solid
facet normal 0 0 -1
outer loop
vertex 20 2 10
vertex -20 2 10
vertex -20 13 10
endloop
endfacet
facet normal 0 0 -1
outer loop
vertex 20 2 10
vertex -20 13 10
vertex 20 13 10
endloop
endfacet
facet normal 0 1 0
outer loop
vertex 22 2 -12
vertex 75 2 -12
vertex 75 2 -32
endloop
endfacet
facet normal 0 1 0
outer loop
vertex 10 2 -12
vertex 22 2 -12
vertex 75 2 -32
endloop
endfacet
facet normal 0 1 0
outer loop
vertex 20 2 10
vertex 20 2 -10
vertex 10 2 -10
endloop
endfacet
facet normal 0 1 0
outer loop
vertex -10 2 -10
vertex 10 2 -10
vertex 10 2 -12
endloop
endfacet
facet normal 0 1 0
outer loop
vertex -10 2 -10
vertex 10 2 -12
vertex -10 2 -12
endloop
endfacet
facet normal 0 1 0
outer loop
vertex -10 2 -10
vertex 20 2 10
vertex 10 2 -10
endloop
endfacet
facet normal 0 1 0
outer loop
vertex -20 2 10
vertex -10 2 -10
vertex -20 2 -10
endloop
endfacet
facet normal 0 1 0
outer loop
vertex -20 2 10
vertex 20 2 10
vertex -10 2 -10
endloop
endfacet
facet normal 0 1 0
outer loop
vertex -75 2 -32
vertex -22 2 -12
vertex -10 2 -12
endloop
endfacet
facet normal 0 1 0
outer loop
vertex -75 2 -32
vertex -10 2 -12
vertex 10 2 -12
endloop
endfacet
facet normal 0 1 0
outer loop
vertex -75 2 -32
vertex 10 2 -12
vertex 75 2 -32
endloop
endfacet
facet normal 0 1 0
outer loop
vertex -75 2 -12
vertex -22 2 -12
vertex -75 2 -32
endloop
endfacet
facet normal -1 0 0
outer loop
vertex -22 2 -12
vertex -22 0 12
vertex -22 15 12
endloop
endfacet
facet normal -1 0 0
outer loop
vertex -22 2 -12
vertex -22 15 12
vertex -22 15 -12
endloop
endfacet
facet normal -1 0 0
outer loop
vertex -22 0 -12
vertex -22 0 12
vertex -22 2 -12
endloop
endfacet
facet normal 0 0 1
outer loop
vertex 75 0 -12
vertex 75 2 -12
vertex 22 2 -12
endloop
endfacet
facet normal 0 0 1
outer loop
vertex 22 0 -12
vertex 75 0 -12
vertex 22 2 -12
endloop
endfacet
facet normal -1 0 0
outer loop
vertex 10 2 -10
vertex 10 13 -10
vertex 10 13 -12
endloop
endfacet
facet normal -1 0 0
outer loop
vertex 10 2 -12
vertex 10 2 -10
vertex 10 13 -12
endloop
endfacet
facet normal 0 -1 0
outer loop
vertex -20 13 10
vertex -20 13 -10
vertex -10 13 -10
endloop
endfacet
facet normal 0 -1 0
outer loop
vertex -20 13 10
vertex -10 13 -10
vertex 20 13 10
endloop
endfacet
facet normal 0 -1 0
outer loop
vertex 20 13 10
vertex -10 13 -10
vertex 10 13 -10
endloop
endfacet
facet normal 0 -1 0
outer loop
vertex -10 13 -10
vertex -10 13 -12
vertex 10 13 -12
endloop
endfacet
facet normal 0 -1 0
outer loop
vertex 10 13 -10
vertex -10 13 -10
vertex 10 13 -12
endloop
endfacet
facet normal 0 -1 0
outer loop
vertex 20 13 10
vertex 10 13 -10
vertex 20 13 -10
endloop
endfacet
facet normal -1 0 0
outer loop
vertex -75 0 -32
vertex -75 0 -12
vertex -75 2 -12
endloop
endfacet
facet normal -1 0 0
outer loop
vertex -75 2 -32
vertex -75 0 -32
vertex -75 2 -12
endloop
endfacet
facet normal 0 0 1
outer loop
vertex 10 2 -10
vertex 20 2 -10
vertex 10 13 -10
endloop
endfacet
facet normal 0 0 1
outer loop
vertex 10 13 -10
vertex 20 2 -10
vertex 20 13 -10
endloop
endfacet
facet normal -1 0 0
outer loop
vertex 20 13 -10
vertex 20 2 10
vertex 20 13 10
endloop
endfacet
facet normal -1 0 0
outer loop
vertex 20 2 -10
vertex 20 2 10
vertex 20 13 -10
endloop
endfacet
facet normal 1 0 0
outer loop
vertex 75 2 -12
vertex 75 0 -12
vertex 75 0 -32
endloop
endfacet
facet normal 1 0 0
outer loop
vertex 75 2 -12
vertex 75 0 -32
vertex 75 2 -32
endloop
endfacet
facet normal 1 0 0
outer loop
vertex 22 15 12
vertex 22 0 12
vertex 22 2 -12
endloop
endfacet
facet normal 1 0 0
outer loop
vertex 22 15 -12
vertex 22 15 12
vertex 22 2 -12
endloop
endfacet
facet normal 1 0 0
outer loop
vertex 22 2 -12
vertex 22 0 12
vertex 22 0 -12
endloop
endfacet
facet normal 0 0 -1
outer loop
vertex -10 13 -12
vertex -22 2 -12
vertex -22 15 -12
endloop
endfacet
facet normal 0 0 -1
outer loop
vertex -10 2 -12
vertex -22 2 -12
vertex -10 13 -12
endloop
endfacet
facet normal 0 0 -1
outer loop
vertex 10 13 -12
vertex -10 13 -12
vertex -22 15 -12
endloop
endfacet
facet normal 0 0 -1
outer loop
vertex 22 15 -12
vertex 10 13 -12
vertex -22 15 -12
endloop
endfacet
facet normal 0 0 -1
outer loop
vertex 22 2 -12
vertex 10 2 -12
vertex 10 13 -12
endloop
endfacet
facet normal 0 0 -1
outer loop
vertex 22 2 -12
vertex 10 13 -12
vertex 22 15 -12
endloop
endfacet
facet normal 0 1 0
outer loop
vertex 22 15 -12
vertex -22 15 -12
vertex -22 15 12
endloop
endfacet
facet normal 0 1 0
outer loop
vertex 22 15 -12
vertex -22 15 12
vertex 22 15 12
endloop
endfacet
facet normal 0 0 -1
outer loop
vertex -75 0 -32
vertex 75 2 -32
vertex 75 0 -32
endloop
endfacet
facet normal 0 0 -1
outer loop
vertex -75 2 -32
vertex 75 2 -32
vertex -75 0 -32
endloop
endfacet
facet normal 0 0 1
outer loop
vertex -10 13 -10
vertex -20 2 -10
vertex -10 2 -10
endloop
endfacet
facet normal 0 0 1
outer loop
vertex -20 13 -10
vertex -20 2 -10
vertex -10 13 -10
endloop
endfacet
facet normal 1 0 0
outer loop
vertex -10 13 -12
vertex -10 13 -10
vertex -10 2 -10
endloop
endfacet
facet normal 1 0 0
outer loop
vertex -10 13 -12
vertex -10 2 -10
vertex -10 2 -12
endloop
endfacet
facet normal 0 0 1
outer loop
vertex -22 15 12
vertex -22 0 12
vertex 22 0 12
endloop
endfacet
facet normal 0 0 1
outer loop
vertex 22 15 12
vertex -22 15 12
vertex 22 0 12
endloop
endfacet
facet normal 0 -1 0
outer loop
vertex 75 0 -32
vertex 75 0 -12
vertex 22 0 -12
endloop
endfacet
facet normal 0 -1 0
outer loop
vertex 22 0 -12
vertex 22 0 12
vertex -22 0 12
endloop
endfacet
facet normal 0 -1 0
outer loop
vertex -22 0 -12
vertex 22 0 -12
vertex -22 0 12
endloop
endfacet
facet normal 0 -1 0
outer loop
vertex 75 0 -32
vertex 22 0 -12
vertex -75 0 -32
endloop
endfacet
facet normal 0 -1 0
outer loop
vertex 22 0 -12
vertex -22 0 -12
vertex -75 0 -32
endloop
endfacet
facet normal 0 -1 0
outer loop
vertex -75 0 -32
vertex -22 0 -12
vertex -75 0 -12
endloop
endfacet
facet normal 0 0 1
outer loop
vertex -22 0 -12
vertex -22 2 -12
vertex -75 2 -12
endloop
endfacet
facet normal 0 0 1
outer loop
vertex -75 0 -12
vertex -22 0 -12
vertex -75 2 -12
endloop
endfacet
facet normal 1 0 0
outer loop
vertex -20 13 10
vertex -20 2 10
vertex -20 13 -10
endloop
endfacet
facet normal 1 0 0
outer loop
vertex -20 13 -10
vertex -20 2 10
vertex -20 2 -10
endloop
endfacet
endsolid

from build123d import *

# Parameters (mm, degrees)
SKETCH5_W           = 44
SKETCH5_H           = 24
BOSS_EXTRUDE3_DEPTH = 15
SHELL1_T            = -2
SKETCH7_W           = 2
SKETCH7_H           = 11.017608059
BOSS_EXTRUDE4_DEPTH = 10
SKETCH9_W           = 150
SKETCH9_H           = 2
BOSS_EXTRUDE5_DEPTH = 20


with BuildPart() as part:
    # Sketch5 → Boss-Extrude3 (new body)
    with BuildSketch(Plane(origin=(0, 0, 0), x_dir=(1, 0, 0), z_dir=(0, 1, 0))):
        Rectangle(SKETCH5_W, SKETCH5_H)
    extrude(amount=BOSS_EXTRUDE3_DEPTH)

    # Shell1
    shell1_openings = [part.faces().sort_by_distance(p)[0] for p in [
        (0, 7.5, -12),
    ]]
    offset(amount=SHELL1_T, openings=shell1_openings, kind=Kind.INTERSECTION)

    # Sketch7 → Boss-Extrude4 (add)
    with BuildSketch(Plane(origin=(-20, 0, 0), x_dir=(0, 0, -1), z_dir=(1, 0, 0))):
        with Locations((11, 7.49119597)):
            Rectangle(SKETCH7_W, SKETCH7_H)
    boss_extrude4 = extrude(amount=BOSS_EXTRUDE4_DEPTH)

    # Mirror1: Boss-Extrude4 across plane
    add(boss_extrude4.mirror(Plane(origin=(0, 0, 0), x_dir=(0, 0, 1), z_dir=(1, 0, 0))))

    # Sketch9 → Boss-Extrude5 (add)
    with BuildSketch(Plane(origin=(0, 0, -12), x_dir=(-1, 0, 0), z_dir=(0, 0, -1))):
        with Locations((0, 1)):
            Rectangle(SKETCH9_W, SKETCH9_H)
    extrude(amount=BOSS_EXTRUDE5_DEPTH)


solid = part.part
